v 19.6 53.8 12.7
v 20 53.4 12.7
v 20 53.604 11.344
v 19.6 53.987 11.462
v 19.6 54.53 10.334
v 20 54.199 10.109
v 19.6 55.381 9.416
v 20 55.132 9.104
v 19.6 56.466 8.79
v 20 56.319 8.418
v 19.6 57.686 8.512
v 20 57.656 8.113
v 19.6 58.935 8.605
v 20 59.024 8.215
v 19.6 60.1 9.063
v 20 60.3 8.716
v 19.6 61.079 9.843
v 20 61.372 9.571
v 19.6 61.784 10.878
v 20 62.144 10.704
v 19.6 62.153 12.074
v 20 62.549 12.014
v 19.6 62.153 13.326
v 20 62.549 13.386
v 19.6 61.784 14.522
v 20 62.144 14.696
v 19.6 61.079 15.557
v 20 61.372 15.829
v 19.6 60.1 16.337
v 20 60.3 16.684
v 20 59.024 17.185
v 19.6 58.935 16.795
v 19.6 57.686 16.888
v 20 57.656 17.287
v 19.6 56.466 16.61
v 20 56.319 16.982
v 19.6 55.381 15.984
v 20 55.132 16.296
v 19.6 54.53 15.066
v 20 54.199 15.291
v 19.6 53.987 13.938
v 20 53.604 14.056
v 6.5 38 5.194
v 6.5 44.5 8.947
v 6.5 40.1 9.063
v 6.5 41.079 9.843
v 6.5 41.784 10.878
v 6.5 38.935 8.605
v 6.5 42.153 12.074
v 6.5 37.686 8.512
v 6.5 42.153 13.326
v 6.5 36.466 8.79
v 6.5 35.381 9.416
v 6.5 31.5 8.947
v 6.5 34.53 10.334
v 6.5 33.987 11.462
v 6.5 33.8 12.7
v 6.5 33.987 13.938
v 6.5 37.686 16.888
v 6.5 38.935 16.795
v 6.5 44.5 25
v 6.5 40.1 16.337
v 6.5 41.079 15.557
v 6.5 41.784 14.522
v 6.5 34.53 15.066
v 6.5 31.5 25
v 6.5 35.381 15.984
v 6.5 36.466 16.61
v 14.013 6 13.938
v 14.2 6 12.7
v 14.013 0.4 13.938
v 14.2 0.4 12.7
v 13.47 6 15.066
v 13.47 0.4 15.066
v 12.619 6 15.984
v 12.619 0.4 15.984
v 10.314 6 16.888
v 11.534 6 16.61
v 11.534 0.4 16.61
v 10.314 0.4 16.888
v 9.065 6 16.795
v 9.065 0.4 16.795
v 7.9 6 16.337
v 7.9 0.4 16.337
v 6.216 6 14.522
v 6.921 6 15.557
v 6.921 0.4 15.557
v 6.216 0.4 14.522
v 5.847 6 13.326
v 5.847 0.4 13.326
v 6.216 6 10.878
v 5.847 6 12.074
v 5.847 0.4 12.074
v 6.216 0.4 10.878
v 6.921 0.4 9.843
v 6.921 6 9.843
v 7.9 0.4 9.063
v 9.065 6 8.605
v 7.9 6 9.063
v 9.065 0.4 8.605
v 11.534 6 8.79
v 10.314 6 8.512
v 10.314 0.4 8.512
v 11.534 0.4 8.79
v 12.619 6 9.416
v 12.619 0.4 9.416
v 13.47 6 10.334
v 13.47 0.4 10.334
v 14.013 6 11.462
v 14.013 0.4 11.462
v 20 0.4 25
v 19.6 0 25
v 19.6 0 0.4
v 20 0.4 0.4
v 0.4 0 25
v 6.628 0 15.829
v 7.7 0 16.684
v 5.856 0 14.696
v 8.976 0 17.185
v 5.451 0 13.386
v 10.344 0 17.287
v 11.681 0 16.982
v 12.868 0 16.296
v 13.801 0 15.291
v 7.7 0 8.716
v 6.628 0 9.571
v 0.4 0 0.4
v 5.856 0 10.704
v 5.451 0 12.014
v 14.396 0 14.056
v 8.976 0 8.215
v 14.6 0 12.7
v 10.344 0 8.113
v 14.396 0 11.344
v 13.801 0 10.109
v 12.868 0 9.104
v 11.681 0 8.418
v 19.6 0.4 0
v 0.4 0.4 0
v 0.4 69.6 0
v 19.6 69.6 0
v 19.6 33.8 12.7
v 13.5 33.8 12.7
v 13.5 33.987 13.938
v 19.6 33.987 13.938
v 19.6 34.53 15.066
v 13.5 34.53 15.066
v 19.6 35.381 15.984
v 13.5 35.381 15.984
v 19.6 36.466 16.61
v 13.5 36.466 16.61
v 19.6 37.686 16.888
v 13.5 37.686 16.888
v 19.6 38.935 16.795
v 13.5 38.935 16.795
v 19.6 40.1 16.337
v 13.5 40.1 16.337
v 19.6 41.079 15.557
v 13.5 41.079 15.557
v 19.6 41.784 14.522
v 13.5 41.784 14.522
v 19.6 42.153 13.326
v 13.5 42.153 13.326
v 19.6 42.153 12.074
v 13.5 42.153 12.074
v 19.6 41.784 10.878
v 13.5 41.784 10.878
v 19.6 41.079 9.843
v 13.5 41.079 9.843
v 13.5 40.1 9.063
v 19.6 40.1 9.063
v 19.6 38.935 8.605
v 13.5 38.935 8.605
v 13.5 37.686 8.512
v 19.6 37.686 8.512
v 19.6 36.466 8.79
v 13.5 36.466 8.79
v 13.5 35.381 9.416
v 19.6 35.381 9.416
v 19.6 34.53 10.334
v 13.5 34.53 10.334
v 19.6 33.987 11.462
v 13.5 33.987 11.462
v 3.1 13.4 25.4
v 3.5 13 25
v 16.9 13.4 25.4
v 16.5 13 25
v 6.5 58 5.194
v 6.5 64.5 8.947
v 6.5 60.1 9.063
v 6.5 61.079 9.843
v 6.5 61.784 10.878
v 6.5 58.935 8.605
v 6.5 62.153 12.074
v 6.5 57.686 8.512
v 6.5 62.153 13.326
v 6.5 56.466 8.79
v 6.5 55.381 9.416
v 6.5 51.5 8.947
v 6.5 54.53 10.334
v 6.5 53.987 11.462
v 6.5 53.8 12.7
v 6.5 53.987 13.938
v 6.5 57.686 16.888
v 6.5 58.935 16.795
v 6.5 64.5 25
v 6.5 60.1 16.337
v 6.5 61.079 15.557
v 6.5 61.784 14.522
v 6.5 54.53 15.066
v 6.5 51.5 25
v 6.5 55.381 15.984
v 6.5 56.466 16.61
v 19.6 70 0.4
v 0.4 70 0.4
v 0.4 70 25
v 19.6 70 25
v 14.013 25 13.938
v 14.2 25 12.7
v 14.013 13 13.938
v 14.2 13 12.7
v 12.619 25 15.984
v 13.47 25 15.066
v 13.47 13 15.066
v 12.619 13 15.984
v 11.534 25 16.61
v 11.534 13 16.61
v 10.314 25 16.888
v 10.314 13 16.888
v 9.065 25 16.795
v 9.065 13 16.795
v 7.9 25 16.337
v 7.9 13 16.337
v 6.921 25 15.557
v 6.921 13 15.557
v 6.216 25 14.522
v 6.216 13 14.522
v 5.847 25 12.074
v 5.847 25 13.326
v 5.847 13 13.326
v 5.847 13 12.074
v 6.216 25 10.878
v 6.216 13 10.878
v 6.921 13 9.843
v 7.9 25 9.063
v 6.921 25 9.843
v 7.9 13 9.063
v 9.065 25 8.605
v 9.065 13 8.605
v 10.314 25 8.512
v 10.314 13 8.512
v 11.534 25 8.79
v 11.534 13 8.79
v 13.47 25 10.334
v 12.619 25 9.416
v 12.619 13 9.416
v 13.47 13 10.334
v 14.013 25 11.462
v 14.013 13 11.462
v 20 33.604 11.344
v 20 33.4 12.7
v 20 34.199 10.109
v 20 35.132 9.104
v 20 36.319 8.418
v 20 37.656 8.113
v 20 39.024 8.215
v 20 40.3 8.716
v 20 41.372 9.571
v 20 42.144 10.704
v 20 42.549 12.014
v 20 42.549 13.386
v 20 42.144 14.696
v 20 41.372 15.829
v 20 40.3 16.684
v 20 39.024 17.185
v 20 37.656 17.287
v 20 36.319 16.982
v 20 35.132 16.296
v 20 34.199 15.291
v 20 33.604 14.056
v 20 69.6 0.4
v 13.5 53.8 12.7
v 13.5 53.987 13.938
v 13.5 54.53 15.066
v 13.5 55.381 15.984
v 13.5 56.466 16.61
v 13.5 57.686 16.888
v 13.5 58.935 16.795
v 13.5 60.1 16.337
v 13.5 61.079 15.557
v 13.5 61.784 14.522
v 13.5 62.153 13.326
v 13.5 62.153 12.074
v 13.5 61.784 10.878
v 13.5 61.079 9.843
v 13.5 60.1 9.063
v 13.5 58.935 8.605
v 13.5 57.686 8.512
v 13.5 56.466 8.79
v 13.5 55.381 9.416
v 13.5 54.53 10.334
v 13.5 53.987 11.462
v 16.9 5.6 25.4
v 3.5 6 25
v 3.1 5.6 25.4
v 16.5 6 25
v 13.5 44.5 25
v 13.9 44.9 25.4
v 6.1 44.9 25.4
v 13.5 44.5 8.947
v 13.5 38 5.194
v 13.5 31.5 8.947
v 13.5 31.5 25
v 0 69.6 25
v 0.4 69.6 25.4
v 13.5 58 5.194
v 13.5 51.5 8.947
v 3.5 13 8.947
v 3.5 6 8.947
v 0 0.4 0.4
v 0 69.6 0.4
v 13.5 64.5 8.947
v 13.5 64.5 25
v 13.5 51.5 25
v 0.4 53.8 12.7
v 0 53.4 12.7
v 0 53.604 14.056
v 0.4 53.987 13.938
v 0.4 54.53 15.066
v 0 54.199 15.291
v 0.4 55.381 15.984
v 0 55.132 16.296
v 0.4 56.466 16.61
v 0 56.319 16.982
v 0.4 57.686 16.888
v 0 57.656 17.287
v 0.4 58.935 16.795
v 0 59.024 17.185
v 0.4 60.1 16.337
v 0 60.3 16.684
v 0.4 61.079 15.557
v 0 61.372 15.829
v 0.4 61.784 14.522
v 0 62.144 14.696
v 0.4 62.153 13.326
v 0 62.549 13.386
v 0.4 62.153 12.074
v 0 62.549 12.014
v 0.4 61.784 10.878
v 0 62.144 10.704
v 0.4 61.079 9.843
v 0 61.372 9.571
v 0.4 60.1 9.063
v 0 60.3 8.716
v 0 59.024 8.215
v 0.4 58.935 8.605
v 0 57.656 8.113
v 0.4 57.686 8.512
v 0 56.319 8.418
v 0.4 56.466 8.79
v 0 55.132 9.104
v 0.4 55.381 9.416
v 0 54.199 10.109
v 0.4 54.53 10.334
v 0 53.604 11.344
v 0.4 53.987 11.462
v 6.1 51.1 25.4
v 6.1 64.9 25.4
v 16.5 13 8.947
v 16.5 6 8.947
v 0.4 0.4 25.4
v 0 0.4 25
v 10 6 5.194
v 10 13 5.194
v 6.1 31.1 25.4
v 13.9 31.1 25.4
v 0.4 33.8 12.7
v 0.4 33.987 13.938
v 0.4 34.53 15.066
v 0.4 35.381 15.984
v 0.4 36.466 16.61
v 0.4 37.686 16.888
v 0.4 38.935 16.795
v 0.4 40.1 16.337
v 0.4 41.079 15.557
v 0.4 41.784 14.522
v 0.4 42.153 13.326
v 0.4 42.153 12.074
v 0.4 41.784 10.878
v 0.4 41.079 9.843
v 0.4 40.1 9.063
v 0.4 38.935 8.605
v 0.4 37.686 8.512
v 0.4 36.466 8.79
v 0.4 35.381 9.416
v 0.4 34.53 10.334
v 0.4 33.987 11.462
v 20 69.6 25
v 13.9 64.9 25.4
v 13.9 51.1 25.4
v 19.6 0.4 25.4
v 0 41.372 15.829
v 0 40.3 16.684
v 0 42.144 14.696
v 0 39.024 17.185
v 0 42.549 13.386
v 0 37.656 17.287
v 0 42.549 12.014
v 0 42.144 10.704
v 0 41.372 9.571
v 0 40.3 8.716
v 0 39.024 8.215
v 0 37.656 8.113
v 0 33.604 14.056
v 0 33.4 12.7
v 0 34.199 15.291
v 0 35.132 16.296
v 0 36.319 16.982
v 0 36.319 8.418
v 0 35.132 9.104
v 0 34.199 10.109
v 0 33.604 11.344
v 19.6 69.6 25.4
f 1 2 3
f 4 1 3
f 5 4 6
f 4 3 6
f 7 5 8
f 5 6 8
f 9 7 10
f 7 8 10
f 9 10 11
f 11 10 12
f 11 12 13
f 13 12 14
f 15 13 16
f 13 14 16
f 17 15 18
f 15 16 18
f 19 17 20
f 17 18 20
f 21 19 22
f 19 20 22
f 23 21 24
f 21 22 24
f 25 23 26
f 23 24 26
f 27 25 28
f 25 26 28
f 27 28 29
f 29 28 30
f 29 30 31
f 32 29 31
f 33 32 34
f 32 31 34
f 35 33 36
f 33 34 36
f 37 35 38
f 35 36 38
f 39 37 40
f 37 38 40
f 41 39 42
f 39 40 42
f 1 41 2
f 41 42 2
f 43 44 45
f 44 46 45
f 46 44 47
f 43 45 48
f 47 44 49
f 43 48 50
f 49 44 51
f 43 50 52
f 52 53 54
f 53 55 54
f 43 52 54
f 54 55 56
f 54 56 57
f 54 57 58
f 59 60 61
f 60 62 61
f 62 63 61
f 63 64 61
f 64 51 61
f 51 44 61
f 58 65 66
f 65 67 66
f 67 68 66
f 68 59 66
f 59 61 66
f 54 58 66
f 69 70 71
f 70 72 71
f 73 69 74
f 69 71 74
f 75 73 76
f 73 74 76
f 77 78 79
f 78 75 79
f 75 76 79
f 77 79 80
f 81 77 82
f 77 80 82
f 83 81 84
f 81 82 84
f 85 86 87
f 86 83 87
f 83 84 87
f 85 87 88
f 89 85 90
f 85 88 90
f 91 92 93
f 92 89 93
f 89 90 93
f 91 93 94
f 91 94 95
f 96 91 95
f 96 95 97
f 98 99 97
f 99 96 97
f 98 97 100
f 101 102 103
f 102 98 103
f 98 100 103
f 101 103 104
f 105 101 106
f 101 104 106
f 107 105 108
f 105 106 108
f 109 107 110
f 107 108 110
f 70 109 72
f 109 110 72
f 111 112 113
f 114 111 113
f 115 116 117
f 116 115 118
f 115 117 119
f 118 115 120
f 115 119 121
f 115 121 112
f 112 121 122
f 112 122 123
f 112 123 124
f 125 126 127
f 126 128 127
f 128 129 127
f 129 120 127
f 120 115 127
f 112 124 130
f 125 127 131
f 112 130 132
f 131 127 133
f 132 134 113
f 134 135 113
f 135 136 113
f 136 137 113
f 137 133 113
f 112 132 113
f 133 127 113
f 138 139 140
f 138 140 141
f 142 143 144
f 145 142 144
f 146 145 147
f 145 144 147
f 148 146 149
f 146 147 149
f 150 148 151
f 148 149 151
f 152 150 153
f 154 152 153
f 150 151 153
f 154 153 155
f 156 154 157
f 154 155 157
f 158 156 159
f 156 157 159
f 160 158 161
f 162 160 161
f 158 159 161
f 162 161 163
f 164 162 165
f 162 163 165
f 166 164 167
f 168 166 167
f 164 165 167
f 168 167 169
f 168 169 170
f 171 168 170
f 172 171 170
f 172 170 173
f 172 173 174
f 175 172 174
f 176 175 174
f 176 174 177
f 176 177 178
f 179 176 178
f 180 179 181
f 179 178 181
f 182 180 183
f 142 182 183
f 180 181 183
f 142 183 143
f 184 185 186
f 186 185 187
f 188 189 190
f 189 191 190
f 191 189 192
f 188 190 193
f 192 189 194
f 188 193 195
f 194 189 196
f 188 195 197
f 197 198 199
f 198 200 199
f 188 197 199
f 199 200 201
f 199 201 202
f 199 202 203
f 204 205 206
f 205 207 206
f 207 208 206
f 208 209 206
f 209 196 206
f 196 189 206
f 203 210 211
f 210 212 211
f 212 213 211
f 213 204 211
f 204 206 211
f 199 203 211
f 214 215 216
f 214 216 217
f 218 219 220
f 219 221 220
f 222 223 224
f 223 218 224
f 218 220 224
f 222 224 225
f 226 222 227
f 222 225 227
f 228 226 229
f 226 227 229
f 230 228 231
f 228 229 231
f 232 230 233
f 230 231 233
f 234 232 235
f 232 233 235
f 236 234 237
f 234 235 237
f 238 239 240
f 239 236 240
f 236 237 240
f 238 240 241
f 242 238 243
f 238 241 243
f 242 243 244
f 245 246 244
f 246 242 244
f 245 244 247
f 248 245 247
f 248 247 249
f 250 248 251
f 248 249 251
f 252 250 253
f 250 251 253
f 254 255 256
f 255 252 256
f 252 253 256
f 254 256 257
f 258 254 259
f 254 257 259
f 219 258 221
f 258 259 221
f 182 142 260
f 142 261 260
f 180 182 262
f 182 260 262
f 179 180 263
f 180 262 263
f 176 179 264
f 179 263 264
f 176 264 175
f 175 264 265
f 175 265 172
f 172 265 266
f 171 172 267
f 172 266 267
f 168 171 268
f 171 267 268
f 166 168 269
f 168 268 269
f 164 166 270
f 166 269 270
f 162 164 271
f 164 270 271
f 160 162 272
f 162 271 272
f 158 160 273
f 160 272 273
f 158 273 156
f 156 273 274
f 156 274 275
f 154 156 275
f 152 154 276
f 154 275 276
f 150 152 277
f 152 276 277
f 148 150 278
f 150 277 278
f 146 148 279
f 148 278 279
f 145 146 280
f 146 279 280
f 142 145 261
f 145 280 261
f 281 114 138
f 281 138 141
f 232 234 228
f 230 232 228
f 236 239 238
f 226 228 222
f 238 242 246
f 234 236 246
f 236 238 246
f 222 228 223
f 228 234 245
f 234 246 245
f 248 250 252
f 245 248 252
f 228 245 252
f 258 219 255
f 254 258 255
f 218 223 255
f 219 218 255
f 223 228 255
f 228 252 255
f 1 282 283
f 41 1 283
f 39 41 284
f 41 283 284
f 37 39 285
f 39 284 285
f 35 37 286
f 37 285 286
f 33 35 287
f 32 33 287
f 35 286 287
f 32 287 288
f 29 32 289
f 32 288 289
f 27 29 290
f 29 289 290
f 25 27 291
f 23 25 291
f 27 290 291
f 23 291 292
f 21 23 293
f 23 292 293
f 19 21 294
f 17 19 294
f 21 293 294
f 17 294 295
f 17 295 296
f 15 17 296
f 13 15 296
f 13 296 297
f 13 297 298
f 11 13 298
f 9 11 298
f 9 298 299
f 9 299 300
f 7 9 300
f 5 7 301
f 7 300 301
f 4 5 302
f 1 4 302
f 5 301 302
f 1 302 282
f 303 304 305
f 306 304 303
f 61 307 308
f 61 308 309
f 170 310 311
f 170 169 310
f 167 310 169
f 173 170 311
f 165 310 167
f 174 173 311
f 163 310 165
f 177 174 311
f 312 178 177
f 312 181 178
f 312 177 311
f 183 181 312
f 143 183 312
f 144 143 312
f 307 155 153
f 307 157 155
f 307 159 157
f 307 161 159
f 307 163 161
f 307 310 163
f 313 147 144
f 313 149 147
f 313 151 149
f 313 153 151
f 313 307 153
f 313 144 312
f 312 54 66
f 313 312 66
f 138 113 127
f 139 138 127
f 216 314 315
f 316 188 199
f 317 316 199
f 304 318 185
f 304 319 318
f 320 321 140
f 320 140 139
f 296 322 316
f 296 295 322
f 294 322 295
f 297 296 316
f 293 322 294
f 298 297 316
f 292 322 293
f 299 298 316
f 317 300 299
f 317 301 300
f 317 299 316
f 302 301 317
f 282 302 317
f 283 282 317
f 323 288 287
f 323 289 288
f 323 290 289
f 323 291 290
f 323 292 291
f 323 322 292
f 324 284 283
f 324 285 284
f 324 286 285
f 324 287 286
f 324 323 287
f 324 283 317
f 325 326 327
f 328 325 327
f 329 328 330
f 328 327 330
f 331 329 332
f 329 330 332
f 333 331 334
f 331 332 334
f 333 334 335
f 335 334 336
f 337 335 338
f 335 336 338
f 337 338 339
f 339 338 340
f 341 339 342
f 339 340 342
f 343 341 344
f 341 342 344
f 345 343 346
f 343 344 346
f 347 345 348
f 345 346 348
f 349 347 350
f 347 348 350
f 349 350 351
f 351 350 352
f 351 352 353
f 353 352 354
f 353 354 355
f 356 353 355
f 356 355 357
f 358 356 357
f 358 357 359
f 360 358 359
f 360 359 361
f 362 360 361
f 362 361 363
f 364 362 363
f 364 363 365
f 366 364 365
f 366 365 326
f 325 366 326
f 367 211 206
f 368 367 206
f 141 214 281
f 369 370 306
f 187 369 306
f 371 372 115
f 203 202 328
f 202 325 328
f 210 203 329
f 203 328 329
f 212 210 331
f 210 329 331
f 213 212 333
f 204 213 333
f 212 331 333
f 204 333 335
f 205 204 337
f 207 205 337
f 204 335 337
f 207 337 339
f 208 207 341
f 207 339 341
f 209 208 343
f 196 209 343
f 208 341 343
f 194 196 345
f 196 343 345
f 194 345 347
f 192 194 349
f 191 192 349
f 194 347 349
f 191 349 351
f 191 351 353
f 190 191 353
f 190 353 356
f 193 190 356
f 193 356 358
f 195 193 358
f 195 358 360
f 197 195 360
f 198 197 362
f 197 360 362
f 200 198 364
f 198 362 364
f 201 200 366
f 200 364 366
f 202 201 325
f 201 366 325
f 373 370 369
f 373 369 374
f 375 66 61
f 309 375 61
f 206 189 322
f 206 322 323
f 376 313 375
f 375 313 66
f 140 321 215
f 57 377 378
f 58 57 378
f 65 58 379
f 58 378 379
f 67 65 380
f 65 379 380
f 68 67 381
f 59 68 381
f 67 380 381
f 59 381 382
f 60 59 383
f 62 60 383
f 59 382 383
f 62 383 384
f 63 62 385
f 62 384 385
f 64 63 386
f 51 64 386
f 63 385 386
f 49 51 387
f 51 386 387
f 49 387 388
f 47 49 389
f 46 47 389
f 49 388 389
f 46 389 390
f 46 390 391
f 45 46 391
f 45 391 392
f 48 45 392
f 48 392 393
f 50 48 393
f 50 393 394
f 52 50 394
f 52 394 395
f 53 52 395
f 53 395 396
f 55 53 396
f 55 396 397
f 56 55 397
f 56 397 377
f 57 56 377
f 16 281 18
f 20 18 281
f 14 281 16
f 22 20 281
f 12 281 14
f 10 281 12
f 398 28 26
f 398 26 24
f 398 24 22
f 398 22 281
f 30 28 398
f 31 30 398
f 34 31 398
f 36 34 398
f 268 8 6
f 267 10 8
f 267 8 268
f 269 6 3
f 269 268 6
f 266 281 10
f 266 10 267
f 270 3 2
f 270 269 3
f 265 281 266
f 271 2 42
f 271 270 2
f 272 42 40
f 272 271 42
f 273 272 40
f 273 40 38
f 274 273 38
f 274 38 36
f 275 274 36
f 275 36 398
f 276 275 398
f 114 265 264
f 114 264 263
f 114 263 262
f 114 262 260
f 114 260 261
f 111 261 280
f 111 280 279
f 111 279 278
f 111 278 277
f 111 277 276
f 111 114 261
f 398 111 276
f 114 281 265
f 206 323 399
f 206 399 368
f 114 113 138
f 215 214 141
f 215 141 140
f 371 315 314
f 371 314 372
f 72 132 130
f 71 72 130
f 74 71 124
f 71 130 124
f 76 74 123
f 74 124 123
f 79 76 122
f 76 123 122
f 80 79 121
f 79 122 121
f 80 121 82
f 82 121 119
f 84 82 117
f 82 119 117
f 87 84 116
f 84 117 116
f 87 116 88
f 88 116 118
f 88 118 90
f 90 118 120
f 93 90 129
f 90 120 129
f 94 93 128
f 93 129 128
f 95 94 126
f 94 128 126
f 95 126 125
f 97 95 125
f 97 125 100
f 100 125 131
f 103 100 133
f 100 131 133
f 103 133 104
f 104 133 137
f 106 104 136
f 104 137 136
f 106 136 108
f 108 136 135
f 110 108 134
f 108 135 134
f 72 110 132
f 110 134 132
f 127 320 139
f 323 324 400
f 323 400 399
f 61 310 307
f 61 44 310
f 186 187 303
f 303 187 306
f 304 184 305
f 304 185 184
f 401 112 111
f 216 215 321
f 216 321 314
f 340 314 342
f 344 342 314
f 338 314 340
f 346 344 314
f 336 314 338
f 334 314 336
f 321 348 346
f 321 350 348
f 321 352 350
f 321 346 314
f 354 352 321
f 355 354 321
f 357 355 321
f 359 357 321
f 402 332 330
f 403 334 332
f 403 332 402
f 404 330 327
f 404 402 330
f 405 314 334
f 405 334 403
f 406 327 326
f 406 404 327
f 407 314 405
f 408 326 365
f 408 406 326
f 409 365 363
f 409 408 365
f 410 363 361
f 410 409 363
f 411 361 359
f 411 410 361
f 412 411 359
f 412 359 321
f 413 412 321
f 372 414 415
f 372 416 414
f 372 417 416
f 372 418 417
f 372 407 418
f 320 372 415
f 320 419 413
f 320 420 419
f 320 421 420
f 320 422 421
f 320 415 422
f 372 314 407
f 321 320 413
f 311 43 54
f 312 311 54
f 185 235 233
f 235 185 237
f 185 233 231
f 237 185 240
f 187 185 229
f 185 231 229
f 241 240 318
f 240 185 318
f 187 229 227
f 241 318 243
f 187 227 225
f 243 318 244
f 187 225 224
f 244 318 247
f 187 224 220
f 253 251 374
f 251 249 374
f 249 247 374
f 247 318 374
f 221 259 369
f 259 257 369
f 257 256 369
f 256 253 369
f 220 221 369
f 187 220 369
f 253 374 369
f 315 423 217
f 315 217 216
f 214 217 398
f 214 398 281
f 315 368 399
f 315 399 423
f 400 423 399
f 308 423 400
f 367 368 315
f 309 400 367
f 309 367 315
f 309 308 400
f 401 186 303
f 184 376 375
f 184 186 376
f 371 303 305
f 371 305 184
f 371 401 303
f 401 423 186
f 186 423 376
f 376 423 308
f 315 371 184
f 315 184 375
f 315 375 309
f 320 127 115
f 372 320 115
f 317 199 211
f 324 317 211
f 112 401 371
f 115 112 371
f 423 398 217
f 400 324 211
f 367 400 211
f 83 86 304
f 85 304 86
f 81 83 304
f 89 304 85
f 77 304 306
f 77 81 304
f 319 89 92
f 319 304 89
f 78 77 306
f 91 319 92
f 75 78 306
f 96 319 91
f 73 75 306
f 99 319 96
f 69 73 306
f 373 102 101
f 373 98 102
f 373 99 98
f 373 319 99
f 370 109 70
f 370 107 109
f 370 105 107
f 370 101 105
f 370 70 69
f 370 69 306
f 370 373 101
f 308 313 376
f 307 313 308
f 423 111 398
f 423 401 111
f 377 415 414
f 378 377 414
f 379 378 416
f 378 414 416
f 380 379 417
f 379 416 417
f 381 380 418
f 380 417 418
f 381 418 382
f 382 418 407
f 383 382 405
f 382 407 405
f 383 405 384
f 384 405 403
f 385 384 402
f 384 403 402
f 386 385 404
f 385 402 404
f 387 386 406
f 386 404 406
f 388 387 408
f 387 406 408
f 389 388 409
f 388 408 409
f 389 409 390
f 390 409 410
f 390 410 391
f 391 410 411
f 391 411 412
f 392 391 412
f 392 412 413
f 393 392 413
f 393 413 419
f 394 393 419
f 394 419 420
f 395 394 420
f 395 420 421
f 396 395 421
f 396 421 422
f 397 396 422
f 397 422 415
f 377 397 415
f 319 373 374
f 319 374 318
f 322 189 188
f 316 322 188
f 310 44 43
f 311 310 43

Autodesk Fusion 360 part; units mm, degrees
sketch "Sketch1" plane through (0, 0, 0) normal (0, 1, 0) x (1, 0, 0)
  line L0 (0, 0) -> (20, 0)
  line L1 (20, 0) -> (20, -25.4)
  line L2 (20, -25.4) -> (0, -25.4)
  line L3 (0, -25.4) -> (0, 0)
  line L4 (10, -25.4) -> (10, 0) construction
  line L5 (16.5, -16.4528) -> (16.5, -8.9472)
  line L6 (16.5, -8.9472) -> (10, -5.1944)
  line L7 (10, -5.1944) -> (3.5, -8.9472)
  line L8 (3.5, -8.9472) -> (3.5, -16.4528)
  line L9 (3.5, -16.4528) -> (10, -20.2056)
  line L10 (10, -20.2056) -> (16.5, -16.4528)
  circle A0 centre (10, -12.7) radius 4.2
  line L11 (16.5, -16.4528) -> (16.5, -25.4)
  line L12 (3.5, -16.4528) -> (3.5, -25.4)
  point P0 (10, -12.7)
  dimension "d1" = 20
  dimension "d2" = 25.4
  dimension "d3" = 13
  dimension "d4" = 8.4
extrude "Extrude1" add sketch "Sketch1" along normal blind 70 contours L0 L1 L2 L3 L5 L6 L7 L8 L11 L12 | L2 L9 L10 L11 L12 | L5 L6 L7 L8 L9 L10 | A0
extrude "Extrude5" cut sketch "Sketch1" along normal blind 25 contours A0
extrude "Extrude2" cut sketch "Sketch1" along normal blind 7 from surface at 6 contours L2 L9 L10 L11 L12 | L5 L6 L7 L8 L9 L10
sketch "Sketch2" plane through (0, 0, 0) normal (-1, 0, 0) x (0, -1, 0)
  line L0 (0, 0) -> (0, 25.4)
  line L1 (0, 25.4) -> (-70, 25.4)
  line L2 (-70, 25.4) -> (-70, 0)
  line L3 (-70, 0) -> (0, 0)
  line L4 (-70, 12.7) -> (0, 12.7) construction
  line L5 (-58, 5.1944) -> (-51.5, 8.9472)
  line L6 (-51.5, 8.9472) -> (-51.5, 16.4528)
  line L7 (-51.5, 16.4528) -> (-58, 20.2056)
  line L8 (-58, 20.2056) -> (-64.5, 16.4528)
  line L9 (-64.5, 16.4528) -> (-64.5, 8.9472)
  line L10 (-64.5, 8.9472) -> (-58, 5.1944)
  circle A0 centre (-58, 12.7) radius 4.2
  line L11 (-64.5, 16.4528) -> (-64.5, 25.4)
  line L12 (-51.5, 16.4528) -> (-51.5, 25.4)
  circle A1 centre (-38, 12.7) radius 4.2
  line L13 (-31.5, 8.9472) -> (-31.5, 16.4528)
  line L14 (-31.5, 16.4528) -> (-38, 20.2056)
  line L15 (-38, 20.2056) -> (-44.5, 16.4528)
  line L16 (-44.5, 16.4528) -> (-44.5, 8.9472)
  line L17 (-44.5, 8.9472) -> (-38, 5.1944)
  line L18 (-38, 5.1944) -> (-31.5, 8.9472)
  line L19 (-44.5, 16.4528) -> (-44.5, 25.4)
  line L20 (-31.5, 16.4528) -> (-31.5, 25.4)
  point P0 (-58, 12.7)
  point P1 (-38, 12.7)
  dimension "d11" = 12
  dimension "d12" = 13
  dimension "d13" = 8.4
  dimension "d20" = 20
extrude "Extrude3" cut sketch "Sketch2" against normal blind 24 contours A0 | A1
extrude "Extrude4" cut sketch "Sketch2" against normal blind 7 from surface at -6.5 contours L1 L14 L15 L19 L20 | L13 L14 L15 L16 L17 L18 | L1 L7 L8 L11 L12 | L5 L6 L7 L8 L9 L10
chamfer "Chamfer1" distance 0.4 angle 45 29 edges at (0, 70, 12.7) (20, 70, 12.7) (20, 0, 12.7) (0, 0, 12.7) (0, 35, 0) (0, 35, 25.4) (10, 0, 0) (10, 0, 25.4) (20, 35, 25.4) (10, 70, 25.4) (10, 64.5, 25.4) (6.5, 58, 25.4) (13.5, 58, 25.4) (10, 51.5, 25.4) (10, 13, 25.4) (16.5, 9.5, 25.4) (10, 6, 25.4) (3.5, 9.5, 25.4) (0, 61.9158, 14.2188) (10, 70, 0) (20, 61.9158, 11.1812) (20, 35, 0) (10, 44.5, 25.4) (13.5, 38, 25.4) (10, 31.5, 25.4) (6.5, 38, 25.4) (20, 41.9158, 11.1812) (6.0842, 0, 14.2188) (0, 41.9158, 14.2188)
